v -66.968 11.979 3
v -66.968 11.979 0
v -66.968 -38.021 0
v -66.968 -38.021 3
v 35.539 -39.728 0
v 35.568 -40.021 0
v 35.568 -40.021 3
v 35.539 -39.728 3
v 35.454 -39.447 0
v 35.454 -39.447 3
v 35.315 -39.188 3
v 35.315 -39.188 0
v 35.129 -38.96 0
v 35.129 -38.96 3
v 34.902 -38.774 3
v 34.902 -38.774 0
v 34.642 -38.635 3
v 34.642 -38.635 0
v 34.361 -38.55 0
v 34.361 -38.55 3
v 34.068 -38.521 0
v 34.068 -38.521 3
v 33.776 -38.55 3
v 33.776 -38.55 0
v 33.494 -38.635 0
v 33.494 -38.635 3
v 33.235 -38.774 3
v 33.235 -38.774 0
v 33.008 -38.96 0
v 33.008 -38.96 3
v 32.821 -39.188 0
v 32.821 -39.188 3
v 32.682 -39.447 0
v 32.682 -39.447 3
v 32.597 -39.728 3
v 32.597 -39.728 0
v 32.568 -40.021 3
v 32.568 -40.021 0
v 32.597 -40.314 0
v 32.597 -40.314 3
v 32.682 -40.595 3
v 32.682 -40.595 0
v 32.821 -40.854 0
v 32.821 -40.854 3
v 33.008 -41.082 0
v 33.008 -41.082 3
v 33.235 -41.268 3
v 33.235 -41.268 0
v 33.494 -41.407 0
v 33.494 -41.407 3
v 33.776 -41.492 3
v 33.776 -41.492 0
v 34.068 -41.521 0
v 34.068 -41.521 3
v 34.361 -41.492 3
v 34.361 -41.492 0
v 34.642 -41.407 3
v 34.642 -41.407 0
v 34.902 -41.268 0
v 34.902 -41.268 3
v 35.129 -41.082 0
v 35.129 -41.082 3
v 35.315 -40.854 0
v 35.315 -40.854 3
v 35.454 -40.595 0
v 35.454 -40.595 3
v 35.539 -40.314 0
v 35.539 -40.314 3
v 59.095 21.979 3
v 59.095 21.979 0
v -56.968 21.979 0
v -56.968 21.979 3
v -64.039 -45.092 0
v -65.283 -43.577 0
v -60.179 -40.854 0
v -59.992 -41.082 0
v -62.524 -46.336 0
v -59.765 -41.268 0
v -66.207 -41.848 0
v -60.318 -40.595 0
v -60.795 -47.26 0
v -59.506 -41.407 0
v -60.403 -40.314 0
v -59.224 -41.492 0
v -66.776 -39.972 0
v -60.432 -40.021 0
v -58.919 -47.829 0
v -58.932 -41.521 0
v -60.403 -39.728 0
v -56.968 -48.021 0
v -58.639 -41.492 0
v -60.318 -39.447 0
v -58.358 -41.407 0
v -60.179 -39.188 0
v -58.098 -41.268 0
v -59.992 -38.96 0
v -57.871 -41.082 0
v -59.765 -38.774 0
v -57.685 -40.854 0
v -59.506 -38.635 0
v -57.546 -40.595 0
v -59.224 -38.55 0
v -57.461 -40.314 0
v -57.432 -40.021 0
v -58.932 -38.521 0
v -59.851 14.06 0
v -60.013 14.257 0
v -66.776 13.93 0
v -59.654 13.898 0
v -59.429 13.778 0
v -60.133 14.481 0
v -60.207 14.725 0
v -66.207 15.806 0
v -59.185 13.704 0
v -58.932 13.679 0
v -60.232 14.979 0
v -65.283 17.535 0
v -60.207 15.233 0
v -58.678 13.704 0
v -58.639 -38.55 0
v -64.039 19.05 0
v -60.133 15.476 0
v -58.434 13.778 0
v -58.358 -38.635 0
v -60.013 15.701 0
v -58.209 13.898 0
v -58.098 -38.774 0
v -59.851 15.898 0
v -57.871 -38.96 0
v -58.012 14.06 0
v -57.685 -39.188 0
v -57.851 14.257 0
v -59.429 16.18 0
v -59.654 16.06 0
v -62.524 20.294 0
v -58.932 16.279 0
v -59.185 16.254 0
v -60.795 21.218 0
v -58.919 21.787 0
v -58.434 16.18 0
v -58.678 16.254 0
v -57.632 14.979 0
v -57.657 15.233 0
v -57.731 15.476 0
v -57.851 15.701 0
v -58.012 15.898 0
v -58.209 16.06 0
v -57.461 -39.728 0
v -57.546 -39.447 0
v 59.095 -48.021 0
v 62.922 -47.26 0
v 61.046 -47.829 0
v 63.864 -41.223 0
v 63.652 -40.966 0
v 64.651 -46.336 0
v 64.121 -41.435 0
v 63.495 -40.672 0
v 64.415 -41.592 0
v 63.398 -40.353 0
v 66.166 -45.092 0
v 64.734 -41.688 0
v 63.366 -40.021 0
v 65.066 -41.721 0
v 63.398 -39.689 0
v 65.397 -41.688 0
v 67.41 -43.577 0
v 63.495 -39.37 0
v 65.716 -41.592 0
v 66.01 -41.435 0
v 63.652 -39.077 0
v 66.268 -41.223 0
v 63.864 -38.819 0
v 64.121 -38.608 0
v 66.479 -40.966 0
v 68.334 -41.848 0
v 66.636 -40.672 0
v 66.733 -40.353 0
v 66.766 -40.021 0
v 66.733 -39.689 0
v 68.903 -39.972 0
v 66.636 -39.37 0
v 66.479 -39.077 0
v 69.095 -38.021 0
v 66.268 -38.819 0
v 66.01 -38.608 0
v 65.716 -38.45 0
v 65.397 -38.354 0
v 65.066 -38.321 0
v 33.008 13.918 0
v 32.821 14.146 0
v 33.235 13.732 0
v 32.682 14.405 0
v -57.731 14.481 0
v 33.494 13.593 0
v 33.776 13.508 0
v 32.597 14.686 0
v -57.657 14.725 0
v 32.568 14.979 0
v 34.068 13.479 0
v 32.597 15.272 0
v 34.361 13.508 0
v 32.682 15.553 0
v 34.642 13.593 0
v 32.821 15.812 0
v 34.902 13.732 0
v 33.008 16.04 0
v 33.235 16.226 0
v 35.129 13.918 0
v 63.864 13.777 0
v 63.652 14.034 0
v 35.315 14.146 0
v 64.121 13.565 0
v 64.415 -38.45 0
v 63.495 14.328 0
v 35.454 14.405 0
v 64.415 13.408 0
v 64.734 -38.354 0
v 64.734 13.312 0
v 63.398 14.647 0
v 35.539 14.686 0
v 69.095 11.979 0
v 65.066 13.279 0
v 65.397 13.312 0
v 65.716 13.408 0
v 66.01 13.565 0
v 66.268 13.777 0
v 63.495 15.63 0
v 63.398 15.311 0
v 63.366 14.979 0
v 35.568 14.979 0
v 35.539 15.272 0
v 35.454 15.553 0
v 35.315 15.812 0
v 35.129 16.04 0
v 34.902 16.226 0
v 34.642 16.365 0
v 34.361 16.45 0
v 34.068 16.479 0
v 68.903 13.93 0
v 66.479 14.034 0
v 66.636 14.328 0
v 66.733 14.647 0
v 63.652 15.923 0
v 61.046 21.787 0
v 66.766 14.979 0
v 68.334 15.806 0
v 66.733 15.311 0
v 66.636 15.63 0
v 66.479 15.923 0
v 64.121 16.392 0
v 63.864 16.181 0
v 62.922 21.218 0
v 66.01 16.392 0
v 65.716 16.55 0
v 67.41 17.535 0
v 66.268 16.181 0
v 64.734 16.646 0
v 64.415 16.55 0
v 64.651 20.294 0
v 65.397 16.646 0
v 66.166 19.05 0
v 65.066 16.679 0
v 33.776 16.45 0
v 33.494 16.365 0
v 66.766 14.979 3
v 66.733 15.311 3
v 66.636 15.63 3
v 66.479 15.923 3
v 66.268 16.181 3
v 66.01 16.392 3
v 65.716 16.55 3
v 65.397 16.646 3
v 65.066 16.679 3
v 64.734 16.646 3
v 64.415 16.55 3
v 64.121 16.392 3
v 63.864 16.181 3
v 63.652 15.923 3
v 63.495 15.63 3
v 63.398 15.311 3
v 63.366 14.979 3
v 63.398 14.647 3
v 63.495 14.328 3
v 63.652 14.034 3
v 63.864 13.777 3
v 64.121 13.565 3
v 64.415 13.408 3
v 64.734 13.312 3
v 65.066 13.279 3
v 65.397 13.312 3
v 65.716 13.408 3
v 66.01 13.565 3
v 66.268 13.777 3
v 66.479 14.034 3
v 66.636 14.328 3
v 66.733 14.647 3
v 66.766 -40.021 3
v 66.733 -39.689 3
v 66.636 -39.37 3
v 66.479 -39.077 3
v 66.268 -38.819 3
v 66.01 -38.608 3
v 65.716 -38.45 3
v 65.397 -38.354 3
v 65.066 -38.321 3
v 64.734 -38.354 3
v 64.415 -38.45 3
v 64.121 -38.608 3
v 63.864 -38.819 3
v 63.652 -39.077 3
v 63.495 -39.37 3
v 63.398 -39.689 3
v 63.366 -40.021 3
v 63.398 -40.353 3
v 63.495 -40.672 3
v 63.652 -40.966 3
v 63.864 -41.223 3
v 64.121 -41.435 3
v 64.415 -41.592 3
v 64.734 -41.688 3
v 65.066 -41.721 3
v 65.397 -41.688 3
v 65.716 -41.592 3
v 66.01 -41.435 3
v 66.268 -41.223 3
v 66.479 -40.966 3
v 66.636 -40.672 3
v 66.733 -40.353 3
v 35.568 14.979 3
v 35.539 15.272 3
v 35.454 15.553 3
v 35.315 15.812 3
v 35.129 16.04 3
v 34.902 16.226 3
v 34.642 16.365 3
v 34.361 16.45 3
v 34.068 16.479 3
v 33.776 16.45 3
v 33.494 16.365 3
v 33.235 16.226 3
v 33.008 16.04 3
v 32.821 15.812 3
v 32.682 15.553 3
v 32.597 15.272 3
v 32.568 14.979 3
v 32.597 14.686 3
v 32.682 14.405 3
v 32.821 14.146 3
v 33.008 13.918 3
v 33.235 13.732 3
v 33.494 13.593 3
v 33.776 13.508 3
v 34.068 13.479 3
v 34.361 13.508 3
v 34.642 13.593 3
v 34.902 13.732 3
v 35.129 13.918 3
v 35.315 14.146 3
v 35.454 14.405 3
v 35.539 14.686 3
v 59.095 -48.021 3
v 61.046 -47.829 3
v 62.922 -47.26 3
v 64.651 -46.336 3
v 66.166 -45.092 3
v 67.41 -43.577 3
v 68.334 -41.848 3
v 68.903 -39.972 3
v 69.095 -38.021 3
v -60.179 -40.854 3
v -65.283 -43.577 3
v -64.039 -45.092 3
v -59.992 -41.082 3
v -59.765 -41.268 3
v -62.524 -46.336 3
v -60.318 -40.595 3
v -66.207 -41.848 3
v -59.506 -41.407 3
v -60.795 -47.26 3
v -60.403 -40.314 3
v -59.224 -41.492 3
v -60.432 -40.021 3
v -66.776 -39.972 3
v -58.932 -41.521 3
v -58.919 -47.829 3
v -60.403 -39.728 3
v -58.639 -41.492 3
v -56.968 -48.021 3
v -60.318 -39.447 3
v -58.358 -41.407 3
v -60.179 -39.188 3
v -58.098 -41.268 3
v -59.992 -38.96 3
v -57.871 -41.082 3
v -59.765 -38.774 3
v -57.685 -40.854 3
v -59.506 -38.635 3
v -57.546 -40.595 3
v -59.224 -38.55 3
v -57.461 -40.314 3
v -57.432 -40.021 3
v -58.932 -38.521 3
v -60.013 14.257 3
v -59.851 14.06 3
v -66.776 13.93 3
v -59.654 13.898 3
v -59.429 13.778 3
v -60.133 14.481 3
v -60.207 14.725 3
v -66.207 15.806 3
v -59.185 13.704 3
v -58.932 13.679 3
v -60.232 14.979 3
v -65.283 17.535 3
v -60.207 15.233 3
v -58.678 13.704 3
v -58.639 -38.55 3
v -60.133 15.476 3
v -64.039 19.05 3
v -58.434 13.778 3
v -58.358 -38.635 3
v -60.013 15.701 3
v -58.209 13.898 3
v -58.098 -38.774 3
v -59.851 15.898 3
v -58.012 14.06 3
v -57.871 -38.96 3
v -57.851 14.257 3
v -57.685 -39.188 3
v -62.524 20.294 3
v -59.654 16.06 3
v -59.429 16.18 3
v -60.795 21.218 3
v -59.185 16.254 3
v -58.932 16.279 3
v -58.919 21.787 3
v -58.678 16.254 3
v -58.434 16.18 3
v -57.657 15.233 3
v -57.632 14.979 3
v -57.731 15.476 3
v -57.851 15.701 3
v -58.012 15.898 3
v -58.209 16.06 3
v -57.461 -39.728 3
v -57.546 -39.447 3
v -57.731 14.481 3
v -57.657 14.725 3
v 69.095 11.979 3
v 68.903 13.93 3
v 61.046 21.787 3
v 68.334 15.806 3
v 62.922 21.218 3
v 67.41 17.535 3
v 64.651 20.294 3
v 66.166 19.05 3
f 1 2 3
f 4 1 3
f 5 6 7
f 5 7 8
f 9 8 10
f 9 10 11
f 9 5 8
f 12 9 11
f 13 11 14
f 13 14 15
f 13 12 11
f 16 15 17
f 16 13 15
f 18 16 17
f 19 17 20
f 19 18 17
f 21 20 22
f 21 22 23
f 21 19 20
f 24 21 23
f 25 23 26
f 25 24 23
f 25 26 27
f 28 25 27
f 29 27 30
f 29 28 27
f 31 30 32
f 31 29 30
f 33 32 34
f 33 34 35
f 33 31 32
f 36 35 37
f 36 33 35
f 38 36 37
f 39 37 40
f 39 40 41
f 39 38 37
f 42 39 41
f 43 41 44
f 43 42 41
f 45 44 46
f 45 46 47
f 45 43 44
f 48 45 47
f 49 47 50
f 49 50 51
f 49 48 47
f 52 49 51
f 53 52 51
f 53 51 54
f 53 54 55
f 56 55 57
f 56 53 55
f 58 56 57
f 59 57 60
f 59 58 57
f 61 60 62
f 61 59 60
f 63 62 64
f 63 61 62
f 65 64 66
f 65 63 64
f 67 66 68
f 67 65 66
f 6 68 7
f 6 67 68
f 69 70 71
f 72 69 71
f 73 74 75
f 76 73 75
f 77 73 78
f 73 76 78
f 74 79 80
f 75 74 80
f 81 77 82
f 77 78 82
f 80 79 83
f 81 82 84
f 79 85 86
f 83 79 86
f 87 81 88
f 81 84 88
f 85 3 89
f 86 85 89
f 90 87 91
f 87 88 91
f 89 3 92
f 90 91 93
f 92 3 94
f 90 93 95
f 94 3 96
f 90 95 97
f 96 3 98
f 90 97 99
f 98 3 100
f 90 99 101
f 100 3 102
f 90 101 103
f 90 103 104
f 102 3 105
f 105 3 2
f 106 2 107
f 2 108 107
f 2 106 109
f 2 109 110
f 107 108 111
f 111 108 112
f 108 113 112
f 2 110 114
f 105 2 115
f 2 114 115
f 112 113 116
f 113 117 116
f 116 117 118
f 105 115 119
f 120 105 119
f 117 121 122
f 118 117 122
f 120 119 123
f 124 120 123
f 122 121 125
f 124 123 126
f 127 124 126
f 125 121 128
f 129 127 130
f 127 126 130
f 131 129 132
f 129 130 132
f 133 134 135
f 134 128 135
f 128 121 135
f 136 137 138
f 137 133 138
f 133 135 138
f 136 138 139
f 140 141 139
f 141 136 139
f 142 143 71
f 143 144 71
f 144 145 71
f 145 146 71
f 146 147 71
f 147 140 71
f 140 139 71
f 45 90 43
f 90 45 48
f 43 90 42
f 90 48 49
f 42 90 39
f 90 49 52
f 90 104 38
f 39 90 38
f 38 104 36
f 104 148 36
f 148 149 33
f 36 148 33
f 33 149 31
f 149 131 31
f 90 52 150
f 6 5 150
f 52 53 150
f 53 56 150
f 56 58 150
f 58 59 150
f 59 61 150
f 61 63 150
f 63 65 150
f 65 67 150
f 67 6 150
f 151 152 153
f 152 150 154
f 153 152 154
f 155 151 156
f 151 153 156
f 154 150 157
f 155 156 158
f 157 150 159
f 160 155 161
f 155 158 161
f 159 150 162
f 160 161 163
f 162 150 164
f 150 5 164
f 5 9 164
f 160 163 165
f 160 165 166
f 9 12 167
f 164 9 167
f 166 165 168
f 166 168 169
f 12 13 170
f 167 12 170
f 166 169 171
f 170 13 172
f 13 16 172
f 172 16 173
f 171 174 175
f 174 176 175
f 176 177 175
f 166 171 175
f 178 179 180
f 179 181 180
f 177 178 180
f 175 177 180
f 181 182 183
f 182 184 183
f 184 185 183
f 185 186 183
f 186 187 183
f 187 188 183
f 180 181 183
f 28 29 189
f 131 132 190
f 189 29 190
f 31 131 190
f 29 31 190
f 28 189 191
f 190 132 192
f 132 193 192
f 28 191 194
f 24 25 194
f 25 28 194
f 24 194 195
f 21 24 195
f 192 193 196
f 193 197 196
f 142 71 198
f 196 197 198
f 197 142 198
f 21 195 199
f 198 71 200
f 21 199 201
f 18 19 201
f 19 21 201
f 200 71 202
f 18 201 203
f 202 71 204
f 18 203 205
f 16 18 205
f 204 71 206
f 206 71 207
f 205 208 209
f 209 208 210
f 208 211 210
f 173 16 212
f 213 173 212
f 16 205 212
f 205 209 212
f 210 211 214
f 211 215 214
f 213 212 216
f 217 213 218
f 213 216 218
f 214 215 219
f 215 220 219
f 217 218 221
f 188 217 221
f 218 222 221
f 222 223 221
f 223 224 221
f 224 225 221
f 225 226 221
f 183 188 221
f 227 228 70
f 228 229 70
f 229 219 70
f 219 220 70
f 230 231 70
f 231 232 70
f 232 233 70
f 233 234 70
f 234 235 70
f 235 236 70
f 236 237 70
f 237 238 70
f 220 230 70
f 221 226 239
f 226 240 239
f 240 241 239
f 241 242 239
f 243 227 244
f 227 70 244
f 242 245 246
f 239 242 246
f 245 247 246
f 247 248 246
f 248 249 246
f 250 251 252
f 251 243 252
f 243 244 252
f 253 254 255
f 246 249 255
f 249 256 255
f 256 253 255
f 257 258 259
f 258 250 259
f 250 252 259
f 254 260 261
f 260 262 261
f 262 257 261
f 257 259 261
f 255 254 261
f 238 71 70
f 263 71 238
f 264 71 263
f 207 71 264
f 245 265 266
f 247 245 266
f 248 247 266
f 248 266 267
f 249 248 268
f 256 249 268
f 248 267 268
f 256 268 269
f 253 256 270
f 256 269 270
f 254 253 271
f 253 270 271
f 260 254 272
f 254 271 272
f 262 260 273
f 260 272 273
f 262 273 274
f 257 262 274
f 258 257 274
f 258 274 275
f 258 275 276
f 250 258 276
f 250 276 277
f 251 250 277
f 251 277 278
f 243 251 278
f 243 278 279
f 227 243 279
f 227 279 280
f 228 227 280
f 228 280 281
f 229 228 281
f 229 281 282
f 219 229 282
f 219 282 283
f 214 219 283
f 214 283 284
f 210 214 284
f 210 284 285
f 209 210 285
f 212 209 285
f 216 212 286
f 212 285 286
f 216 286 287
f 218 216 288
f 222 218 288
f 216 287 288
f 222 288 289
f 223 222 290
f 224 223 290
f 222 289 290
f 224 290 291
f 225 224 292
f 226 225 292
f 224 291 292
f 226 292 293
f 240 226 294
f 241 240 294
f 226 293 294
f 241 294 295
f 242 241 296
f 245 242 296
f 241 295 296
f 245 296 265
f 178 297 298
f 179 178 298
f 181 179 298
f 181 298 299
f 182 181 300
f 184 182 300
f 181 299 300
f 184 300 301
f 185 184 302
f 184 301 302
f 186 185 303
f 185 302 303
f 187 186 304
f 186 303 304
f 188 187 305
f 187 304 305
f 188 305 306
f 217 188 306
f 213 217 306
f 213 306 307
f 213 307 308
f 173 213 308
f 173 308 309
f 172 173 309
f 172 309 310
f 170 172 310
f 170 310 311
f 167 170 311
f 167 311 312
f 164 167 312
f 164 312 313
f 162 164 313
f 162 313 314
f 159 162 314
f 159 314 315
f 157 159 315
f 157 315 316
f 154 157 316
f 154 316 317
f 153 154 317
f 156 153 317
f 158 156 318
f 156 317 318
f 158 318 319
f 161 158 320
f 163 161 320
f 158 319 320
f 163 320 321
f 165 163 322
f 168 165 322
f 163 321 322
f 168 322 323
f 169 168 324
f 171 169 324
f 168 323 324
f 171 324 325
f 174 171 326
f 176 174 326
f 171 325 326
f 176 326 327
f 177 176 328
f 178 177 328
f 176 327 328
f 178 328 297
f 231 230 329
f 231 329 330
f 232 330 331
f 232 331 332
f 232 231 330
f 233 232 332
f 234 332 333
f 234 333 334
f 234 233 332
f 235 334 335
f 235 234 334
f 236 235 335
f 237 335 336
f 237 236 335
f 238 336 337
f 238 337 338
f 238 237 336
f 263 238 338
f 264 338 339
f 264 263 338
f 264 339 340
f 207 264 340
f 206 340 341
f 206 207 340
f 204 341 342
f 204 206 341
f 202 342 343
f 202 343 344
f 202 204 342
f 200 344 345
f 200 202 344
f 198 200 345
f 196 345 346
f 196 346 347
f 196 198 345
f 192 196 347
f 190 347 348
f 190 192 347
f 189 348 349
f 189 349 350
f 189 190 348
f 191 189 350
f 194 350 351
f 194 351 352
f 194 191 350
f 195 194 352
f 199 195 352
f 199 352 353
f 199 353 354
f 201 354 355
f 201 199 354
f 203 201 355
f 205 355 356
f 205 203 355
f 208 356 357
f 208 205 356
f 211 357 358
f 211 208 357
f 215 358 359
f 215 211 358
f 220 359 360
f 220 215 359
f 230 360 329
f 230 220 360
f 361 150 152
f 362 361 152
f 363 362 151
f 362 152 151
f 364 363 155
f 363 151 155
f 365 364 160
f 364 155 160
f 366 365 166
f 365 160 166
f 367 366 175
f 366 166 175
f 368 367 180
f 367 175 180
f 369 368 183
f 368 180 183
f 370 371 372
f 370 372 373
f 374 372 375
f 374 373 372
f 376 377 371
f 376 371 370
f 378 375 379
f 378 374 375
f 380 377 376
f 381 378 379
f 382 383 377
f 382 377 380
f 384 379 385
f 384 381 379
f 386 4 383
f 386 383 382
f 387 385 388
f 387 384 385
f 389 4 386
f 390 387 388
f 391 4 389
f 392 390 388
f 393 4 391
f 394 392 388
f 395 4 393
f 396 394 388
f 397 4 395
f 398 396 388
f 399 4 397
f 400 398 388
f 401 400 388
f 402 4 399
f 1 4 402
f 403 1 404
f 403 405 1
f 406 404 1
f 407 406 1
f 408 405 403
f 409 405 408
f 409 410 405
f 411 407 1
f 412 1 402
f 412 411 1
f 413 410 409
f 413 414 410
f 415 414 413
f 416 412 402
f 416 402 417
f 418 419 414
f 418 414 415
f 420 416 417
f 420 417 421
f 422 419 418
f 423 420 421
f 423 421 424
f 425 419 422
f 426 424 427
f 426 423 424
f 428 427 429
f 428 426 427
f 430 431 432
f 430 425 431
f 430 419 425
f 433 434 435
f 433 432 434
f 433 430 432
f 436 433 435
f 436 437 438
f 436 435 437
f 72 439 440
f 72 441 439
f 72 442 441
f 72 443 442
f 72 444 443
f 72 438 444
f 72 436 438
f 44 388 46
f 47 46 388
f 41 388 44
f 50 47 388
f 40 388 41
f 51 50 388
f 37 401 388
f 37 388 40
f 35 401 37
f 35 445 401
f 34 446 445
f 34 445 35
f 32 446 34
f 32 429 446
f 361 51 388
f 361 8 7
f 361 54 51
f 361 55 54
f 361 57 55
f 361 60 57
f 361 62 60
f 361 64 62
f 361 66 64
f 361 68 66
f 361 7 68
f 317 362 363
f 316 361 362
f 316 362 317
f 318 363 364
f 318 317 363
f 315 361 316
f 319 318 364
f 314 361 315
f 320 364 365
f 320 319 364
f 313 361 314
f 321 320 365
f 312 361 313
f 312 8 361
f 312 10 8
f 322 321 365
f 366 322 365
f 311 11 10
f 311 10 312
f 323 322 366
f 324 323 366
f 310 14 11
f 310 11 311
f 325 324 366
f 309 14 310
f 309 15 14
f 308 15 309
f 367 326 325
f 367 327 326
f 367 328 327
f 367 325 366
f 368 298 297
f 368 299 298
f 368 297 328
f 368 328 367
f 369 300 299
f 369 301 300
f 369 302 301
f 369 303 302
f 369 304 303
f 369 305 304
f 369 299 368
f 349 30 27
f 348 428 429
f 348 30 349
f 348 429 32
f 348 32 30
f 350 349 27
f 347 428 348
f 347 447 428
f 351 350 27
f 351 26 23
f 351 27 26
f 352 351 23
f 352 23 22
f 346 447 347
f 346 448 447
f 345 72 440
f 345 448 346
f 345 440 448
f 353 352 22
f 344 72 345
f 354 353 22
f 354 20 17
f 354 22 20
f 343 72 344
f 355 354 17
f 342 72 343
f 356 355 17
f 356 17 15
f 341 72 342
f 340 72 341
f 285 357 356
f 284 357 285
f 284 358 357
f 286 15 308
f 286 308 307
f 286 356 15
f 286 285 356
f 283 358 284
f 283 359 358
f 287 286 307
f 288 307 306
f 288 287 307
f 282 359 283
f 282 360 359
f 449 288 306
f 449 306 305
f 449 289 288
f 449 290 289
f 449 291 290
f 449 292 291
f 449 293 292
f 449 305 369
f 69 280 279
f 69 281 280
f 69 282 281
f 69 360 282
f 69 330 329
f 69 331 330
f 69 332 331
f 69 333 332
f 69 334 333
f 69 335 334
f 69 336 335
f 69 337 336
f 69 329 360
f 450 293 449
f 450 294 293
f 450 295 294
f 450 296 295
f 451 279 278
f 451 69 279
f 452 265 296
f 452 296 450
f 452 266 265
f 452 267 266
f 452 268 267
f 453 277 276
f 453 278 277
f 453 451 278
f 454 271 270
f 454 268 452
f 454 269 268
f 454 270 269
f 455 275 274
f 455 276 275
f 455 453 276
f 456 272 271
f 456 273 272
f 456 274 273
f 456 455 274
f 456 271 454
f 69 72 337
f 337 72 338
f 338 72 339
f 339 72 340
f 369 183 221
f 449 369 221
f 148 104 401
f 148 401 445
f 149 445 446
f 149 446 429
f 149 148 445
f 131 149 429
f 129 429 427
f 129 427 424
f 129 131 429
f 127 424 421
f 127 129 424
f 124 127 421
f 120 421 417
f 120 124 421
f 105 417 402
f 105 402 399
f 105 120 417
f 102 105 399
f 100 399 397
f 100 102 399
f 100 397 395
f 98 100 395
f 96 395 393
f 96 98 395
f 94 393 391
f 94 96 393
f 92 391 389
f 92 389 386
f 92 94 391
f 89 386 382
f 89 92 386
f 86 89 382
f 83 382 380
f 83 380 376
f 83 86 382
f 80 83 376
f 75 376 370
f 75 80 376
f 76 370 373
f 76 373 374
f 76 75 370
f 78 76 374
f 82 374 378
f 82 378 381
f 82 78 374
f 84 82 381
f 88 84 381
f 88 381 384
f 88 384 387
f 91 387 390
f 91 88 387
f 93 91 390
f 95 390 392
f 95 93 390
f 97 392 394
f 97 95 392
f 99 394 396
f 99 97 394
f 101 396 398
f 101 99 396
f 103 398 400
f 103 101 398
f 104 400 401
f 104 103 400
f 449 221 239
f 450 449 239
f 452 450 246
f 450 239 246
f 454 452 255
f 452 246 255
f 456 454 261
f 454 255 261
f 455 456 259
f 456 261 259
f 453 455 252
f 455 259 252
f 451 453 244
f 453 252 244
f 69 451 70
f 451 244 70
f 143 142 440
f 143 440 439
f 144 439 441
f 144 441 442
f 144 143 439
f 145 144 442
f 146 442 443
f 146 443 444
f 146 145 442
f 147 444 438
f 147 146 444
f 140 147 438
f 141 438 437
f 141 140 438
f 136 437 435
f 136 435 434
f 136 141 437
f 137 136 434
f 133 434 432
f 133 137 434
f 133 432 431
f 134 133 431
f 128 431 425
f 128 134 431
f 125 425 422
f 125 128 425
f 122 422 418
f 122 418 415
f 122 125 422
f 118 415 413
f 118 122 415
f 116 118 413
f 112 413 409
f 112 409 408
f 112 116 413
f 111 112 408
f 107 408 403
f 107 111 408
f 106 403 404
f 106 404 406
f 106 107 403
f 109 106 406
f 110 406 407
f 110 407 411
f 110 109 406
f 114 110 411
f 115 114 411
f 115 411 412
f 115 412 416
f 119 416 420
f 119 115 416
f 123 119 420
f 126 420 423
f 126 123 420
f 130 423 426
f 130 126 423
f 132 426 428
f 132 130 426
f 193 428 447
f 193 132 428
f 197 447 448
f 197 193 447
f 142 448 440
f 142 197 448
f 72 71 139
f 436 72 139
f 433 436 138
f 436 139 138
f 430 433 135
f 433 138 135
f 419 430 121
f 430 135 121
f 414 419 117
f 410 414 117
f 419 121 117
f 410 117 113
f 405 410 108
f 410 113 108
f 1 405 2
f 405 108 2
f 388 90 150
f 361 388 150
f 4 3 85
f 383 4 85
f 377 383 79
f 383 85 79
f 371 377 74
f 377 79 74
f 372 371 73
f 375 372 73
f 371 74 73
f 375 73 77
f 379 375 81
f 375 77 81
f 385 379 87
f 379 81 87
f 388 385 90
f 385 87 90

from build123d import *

# Parameters (mm, degrees)
SKETCH1_R            = 1.3
SKETCH1_R_2          = 1.5
BOSS_EXTRUDE1_DEPTH  = 3
M3_CLEARANCE_HOLE1_D = 3.4


with BuildPart() as part:
    # Sketch1 → Boss-Extrude1 (new body)
    with BuildSketch(Plane.XY):
        with BuildLine():
            Line((-66.968320128, 11.978952762), (-66.968320128, -38.021047238))
            ThreePointArc((-66.968320128, -38.021047238), (-64.039387939, -45.09211505), (-56.968320128, -48.021047238))
            Line((-56.968320128, -48.021047238), (59.094938721, -48.021047238))
            ThreePointArc((59.094938721, -48.021047238), (66.166006532, -45.09211505), (69.094938721, -38.021047238))
            Line((69.094938721, -38.021047238), (69.094938721, 11.978952762))
            ThreePointArc((69.094938721, 11.978952762), (66.166006532, 19.050020574), (59.094938721, 21.978952762))
            Line((59.094938721, 21.978952762), (-56.968320128, 21.978952762))
            ThreePointArc((-56.968320128, 21.978952762), (-64.039387939, 19.050020574), (-66.968320128, 11.978952762))
        make_face()
        with Locations((-58.93171984, 14.978952762)):
            Circle(SKETCH1_R, mode=Mode.SUBTRACT)
        with Locations((34.06828016, 14.978952762)):
            Circle(SKETCH1_R_2, mode=Mode.SUBTRACT)
        with Locations((34.06828016, -40.021047238)):
            Circle(SKETCH1_R_2, mode=Mode.SUBTRACT)
        with Locations((-58.93171984, -40.021047238)):
            Circle(SKETCH1_R_2, mode=Mode.SUBTRACT)
    extrude(amount=BOSS_EXTRUDE1_DEPTH)

    # M3 Clearance Hole1 (through all)
    with Locations(Plane(origin=(0, 0, 0), x_dir=(-1, 0, 0), z_dir=(0, 0, -1))):
        with Locations((-65.065816686, -40.021047238), (-65.065816686, 14.978952762)):
            Hole(M3_CLEARANCE_HOLE1_D / 2)


solid = part.part
